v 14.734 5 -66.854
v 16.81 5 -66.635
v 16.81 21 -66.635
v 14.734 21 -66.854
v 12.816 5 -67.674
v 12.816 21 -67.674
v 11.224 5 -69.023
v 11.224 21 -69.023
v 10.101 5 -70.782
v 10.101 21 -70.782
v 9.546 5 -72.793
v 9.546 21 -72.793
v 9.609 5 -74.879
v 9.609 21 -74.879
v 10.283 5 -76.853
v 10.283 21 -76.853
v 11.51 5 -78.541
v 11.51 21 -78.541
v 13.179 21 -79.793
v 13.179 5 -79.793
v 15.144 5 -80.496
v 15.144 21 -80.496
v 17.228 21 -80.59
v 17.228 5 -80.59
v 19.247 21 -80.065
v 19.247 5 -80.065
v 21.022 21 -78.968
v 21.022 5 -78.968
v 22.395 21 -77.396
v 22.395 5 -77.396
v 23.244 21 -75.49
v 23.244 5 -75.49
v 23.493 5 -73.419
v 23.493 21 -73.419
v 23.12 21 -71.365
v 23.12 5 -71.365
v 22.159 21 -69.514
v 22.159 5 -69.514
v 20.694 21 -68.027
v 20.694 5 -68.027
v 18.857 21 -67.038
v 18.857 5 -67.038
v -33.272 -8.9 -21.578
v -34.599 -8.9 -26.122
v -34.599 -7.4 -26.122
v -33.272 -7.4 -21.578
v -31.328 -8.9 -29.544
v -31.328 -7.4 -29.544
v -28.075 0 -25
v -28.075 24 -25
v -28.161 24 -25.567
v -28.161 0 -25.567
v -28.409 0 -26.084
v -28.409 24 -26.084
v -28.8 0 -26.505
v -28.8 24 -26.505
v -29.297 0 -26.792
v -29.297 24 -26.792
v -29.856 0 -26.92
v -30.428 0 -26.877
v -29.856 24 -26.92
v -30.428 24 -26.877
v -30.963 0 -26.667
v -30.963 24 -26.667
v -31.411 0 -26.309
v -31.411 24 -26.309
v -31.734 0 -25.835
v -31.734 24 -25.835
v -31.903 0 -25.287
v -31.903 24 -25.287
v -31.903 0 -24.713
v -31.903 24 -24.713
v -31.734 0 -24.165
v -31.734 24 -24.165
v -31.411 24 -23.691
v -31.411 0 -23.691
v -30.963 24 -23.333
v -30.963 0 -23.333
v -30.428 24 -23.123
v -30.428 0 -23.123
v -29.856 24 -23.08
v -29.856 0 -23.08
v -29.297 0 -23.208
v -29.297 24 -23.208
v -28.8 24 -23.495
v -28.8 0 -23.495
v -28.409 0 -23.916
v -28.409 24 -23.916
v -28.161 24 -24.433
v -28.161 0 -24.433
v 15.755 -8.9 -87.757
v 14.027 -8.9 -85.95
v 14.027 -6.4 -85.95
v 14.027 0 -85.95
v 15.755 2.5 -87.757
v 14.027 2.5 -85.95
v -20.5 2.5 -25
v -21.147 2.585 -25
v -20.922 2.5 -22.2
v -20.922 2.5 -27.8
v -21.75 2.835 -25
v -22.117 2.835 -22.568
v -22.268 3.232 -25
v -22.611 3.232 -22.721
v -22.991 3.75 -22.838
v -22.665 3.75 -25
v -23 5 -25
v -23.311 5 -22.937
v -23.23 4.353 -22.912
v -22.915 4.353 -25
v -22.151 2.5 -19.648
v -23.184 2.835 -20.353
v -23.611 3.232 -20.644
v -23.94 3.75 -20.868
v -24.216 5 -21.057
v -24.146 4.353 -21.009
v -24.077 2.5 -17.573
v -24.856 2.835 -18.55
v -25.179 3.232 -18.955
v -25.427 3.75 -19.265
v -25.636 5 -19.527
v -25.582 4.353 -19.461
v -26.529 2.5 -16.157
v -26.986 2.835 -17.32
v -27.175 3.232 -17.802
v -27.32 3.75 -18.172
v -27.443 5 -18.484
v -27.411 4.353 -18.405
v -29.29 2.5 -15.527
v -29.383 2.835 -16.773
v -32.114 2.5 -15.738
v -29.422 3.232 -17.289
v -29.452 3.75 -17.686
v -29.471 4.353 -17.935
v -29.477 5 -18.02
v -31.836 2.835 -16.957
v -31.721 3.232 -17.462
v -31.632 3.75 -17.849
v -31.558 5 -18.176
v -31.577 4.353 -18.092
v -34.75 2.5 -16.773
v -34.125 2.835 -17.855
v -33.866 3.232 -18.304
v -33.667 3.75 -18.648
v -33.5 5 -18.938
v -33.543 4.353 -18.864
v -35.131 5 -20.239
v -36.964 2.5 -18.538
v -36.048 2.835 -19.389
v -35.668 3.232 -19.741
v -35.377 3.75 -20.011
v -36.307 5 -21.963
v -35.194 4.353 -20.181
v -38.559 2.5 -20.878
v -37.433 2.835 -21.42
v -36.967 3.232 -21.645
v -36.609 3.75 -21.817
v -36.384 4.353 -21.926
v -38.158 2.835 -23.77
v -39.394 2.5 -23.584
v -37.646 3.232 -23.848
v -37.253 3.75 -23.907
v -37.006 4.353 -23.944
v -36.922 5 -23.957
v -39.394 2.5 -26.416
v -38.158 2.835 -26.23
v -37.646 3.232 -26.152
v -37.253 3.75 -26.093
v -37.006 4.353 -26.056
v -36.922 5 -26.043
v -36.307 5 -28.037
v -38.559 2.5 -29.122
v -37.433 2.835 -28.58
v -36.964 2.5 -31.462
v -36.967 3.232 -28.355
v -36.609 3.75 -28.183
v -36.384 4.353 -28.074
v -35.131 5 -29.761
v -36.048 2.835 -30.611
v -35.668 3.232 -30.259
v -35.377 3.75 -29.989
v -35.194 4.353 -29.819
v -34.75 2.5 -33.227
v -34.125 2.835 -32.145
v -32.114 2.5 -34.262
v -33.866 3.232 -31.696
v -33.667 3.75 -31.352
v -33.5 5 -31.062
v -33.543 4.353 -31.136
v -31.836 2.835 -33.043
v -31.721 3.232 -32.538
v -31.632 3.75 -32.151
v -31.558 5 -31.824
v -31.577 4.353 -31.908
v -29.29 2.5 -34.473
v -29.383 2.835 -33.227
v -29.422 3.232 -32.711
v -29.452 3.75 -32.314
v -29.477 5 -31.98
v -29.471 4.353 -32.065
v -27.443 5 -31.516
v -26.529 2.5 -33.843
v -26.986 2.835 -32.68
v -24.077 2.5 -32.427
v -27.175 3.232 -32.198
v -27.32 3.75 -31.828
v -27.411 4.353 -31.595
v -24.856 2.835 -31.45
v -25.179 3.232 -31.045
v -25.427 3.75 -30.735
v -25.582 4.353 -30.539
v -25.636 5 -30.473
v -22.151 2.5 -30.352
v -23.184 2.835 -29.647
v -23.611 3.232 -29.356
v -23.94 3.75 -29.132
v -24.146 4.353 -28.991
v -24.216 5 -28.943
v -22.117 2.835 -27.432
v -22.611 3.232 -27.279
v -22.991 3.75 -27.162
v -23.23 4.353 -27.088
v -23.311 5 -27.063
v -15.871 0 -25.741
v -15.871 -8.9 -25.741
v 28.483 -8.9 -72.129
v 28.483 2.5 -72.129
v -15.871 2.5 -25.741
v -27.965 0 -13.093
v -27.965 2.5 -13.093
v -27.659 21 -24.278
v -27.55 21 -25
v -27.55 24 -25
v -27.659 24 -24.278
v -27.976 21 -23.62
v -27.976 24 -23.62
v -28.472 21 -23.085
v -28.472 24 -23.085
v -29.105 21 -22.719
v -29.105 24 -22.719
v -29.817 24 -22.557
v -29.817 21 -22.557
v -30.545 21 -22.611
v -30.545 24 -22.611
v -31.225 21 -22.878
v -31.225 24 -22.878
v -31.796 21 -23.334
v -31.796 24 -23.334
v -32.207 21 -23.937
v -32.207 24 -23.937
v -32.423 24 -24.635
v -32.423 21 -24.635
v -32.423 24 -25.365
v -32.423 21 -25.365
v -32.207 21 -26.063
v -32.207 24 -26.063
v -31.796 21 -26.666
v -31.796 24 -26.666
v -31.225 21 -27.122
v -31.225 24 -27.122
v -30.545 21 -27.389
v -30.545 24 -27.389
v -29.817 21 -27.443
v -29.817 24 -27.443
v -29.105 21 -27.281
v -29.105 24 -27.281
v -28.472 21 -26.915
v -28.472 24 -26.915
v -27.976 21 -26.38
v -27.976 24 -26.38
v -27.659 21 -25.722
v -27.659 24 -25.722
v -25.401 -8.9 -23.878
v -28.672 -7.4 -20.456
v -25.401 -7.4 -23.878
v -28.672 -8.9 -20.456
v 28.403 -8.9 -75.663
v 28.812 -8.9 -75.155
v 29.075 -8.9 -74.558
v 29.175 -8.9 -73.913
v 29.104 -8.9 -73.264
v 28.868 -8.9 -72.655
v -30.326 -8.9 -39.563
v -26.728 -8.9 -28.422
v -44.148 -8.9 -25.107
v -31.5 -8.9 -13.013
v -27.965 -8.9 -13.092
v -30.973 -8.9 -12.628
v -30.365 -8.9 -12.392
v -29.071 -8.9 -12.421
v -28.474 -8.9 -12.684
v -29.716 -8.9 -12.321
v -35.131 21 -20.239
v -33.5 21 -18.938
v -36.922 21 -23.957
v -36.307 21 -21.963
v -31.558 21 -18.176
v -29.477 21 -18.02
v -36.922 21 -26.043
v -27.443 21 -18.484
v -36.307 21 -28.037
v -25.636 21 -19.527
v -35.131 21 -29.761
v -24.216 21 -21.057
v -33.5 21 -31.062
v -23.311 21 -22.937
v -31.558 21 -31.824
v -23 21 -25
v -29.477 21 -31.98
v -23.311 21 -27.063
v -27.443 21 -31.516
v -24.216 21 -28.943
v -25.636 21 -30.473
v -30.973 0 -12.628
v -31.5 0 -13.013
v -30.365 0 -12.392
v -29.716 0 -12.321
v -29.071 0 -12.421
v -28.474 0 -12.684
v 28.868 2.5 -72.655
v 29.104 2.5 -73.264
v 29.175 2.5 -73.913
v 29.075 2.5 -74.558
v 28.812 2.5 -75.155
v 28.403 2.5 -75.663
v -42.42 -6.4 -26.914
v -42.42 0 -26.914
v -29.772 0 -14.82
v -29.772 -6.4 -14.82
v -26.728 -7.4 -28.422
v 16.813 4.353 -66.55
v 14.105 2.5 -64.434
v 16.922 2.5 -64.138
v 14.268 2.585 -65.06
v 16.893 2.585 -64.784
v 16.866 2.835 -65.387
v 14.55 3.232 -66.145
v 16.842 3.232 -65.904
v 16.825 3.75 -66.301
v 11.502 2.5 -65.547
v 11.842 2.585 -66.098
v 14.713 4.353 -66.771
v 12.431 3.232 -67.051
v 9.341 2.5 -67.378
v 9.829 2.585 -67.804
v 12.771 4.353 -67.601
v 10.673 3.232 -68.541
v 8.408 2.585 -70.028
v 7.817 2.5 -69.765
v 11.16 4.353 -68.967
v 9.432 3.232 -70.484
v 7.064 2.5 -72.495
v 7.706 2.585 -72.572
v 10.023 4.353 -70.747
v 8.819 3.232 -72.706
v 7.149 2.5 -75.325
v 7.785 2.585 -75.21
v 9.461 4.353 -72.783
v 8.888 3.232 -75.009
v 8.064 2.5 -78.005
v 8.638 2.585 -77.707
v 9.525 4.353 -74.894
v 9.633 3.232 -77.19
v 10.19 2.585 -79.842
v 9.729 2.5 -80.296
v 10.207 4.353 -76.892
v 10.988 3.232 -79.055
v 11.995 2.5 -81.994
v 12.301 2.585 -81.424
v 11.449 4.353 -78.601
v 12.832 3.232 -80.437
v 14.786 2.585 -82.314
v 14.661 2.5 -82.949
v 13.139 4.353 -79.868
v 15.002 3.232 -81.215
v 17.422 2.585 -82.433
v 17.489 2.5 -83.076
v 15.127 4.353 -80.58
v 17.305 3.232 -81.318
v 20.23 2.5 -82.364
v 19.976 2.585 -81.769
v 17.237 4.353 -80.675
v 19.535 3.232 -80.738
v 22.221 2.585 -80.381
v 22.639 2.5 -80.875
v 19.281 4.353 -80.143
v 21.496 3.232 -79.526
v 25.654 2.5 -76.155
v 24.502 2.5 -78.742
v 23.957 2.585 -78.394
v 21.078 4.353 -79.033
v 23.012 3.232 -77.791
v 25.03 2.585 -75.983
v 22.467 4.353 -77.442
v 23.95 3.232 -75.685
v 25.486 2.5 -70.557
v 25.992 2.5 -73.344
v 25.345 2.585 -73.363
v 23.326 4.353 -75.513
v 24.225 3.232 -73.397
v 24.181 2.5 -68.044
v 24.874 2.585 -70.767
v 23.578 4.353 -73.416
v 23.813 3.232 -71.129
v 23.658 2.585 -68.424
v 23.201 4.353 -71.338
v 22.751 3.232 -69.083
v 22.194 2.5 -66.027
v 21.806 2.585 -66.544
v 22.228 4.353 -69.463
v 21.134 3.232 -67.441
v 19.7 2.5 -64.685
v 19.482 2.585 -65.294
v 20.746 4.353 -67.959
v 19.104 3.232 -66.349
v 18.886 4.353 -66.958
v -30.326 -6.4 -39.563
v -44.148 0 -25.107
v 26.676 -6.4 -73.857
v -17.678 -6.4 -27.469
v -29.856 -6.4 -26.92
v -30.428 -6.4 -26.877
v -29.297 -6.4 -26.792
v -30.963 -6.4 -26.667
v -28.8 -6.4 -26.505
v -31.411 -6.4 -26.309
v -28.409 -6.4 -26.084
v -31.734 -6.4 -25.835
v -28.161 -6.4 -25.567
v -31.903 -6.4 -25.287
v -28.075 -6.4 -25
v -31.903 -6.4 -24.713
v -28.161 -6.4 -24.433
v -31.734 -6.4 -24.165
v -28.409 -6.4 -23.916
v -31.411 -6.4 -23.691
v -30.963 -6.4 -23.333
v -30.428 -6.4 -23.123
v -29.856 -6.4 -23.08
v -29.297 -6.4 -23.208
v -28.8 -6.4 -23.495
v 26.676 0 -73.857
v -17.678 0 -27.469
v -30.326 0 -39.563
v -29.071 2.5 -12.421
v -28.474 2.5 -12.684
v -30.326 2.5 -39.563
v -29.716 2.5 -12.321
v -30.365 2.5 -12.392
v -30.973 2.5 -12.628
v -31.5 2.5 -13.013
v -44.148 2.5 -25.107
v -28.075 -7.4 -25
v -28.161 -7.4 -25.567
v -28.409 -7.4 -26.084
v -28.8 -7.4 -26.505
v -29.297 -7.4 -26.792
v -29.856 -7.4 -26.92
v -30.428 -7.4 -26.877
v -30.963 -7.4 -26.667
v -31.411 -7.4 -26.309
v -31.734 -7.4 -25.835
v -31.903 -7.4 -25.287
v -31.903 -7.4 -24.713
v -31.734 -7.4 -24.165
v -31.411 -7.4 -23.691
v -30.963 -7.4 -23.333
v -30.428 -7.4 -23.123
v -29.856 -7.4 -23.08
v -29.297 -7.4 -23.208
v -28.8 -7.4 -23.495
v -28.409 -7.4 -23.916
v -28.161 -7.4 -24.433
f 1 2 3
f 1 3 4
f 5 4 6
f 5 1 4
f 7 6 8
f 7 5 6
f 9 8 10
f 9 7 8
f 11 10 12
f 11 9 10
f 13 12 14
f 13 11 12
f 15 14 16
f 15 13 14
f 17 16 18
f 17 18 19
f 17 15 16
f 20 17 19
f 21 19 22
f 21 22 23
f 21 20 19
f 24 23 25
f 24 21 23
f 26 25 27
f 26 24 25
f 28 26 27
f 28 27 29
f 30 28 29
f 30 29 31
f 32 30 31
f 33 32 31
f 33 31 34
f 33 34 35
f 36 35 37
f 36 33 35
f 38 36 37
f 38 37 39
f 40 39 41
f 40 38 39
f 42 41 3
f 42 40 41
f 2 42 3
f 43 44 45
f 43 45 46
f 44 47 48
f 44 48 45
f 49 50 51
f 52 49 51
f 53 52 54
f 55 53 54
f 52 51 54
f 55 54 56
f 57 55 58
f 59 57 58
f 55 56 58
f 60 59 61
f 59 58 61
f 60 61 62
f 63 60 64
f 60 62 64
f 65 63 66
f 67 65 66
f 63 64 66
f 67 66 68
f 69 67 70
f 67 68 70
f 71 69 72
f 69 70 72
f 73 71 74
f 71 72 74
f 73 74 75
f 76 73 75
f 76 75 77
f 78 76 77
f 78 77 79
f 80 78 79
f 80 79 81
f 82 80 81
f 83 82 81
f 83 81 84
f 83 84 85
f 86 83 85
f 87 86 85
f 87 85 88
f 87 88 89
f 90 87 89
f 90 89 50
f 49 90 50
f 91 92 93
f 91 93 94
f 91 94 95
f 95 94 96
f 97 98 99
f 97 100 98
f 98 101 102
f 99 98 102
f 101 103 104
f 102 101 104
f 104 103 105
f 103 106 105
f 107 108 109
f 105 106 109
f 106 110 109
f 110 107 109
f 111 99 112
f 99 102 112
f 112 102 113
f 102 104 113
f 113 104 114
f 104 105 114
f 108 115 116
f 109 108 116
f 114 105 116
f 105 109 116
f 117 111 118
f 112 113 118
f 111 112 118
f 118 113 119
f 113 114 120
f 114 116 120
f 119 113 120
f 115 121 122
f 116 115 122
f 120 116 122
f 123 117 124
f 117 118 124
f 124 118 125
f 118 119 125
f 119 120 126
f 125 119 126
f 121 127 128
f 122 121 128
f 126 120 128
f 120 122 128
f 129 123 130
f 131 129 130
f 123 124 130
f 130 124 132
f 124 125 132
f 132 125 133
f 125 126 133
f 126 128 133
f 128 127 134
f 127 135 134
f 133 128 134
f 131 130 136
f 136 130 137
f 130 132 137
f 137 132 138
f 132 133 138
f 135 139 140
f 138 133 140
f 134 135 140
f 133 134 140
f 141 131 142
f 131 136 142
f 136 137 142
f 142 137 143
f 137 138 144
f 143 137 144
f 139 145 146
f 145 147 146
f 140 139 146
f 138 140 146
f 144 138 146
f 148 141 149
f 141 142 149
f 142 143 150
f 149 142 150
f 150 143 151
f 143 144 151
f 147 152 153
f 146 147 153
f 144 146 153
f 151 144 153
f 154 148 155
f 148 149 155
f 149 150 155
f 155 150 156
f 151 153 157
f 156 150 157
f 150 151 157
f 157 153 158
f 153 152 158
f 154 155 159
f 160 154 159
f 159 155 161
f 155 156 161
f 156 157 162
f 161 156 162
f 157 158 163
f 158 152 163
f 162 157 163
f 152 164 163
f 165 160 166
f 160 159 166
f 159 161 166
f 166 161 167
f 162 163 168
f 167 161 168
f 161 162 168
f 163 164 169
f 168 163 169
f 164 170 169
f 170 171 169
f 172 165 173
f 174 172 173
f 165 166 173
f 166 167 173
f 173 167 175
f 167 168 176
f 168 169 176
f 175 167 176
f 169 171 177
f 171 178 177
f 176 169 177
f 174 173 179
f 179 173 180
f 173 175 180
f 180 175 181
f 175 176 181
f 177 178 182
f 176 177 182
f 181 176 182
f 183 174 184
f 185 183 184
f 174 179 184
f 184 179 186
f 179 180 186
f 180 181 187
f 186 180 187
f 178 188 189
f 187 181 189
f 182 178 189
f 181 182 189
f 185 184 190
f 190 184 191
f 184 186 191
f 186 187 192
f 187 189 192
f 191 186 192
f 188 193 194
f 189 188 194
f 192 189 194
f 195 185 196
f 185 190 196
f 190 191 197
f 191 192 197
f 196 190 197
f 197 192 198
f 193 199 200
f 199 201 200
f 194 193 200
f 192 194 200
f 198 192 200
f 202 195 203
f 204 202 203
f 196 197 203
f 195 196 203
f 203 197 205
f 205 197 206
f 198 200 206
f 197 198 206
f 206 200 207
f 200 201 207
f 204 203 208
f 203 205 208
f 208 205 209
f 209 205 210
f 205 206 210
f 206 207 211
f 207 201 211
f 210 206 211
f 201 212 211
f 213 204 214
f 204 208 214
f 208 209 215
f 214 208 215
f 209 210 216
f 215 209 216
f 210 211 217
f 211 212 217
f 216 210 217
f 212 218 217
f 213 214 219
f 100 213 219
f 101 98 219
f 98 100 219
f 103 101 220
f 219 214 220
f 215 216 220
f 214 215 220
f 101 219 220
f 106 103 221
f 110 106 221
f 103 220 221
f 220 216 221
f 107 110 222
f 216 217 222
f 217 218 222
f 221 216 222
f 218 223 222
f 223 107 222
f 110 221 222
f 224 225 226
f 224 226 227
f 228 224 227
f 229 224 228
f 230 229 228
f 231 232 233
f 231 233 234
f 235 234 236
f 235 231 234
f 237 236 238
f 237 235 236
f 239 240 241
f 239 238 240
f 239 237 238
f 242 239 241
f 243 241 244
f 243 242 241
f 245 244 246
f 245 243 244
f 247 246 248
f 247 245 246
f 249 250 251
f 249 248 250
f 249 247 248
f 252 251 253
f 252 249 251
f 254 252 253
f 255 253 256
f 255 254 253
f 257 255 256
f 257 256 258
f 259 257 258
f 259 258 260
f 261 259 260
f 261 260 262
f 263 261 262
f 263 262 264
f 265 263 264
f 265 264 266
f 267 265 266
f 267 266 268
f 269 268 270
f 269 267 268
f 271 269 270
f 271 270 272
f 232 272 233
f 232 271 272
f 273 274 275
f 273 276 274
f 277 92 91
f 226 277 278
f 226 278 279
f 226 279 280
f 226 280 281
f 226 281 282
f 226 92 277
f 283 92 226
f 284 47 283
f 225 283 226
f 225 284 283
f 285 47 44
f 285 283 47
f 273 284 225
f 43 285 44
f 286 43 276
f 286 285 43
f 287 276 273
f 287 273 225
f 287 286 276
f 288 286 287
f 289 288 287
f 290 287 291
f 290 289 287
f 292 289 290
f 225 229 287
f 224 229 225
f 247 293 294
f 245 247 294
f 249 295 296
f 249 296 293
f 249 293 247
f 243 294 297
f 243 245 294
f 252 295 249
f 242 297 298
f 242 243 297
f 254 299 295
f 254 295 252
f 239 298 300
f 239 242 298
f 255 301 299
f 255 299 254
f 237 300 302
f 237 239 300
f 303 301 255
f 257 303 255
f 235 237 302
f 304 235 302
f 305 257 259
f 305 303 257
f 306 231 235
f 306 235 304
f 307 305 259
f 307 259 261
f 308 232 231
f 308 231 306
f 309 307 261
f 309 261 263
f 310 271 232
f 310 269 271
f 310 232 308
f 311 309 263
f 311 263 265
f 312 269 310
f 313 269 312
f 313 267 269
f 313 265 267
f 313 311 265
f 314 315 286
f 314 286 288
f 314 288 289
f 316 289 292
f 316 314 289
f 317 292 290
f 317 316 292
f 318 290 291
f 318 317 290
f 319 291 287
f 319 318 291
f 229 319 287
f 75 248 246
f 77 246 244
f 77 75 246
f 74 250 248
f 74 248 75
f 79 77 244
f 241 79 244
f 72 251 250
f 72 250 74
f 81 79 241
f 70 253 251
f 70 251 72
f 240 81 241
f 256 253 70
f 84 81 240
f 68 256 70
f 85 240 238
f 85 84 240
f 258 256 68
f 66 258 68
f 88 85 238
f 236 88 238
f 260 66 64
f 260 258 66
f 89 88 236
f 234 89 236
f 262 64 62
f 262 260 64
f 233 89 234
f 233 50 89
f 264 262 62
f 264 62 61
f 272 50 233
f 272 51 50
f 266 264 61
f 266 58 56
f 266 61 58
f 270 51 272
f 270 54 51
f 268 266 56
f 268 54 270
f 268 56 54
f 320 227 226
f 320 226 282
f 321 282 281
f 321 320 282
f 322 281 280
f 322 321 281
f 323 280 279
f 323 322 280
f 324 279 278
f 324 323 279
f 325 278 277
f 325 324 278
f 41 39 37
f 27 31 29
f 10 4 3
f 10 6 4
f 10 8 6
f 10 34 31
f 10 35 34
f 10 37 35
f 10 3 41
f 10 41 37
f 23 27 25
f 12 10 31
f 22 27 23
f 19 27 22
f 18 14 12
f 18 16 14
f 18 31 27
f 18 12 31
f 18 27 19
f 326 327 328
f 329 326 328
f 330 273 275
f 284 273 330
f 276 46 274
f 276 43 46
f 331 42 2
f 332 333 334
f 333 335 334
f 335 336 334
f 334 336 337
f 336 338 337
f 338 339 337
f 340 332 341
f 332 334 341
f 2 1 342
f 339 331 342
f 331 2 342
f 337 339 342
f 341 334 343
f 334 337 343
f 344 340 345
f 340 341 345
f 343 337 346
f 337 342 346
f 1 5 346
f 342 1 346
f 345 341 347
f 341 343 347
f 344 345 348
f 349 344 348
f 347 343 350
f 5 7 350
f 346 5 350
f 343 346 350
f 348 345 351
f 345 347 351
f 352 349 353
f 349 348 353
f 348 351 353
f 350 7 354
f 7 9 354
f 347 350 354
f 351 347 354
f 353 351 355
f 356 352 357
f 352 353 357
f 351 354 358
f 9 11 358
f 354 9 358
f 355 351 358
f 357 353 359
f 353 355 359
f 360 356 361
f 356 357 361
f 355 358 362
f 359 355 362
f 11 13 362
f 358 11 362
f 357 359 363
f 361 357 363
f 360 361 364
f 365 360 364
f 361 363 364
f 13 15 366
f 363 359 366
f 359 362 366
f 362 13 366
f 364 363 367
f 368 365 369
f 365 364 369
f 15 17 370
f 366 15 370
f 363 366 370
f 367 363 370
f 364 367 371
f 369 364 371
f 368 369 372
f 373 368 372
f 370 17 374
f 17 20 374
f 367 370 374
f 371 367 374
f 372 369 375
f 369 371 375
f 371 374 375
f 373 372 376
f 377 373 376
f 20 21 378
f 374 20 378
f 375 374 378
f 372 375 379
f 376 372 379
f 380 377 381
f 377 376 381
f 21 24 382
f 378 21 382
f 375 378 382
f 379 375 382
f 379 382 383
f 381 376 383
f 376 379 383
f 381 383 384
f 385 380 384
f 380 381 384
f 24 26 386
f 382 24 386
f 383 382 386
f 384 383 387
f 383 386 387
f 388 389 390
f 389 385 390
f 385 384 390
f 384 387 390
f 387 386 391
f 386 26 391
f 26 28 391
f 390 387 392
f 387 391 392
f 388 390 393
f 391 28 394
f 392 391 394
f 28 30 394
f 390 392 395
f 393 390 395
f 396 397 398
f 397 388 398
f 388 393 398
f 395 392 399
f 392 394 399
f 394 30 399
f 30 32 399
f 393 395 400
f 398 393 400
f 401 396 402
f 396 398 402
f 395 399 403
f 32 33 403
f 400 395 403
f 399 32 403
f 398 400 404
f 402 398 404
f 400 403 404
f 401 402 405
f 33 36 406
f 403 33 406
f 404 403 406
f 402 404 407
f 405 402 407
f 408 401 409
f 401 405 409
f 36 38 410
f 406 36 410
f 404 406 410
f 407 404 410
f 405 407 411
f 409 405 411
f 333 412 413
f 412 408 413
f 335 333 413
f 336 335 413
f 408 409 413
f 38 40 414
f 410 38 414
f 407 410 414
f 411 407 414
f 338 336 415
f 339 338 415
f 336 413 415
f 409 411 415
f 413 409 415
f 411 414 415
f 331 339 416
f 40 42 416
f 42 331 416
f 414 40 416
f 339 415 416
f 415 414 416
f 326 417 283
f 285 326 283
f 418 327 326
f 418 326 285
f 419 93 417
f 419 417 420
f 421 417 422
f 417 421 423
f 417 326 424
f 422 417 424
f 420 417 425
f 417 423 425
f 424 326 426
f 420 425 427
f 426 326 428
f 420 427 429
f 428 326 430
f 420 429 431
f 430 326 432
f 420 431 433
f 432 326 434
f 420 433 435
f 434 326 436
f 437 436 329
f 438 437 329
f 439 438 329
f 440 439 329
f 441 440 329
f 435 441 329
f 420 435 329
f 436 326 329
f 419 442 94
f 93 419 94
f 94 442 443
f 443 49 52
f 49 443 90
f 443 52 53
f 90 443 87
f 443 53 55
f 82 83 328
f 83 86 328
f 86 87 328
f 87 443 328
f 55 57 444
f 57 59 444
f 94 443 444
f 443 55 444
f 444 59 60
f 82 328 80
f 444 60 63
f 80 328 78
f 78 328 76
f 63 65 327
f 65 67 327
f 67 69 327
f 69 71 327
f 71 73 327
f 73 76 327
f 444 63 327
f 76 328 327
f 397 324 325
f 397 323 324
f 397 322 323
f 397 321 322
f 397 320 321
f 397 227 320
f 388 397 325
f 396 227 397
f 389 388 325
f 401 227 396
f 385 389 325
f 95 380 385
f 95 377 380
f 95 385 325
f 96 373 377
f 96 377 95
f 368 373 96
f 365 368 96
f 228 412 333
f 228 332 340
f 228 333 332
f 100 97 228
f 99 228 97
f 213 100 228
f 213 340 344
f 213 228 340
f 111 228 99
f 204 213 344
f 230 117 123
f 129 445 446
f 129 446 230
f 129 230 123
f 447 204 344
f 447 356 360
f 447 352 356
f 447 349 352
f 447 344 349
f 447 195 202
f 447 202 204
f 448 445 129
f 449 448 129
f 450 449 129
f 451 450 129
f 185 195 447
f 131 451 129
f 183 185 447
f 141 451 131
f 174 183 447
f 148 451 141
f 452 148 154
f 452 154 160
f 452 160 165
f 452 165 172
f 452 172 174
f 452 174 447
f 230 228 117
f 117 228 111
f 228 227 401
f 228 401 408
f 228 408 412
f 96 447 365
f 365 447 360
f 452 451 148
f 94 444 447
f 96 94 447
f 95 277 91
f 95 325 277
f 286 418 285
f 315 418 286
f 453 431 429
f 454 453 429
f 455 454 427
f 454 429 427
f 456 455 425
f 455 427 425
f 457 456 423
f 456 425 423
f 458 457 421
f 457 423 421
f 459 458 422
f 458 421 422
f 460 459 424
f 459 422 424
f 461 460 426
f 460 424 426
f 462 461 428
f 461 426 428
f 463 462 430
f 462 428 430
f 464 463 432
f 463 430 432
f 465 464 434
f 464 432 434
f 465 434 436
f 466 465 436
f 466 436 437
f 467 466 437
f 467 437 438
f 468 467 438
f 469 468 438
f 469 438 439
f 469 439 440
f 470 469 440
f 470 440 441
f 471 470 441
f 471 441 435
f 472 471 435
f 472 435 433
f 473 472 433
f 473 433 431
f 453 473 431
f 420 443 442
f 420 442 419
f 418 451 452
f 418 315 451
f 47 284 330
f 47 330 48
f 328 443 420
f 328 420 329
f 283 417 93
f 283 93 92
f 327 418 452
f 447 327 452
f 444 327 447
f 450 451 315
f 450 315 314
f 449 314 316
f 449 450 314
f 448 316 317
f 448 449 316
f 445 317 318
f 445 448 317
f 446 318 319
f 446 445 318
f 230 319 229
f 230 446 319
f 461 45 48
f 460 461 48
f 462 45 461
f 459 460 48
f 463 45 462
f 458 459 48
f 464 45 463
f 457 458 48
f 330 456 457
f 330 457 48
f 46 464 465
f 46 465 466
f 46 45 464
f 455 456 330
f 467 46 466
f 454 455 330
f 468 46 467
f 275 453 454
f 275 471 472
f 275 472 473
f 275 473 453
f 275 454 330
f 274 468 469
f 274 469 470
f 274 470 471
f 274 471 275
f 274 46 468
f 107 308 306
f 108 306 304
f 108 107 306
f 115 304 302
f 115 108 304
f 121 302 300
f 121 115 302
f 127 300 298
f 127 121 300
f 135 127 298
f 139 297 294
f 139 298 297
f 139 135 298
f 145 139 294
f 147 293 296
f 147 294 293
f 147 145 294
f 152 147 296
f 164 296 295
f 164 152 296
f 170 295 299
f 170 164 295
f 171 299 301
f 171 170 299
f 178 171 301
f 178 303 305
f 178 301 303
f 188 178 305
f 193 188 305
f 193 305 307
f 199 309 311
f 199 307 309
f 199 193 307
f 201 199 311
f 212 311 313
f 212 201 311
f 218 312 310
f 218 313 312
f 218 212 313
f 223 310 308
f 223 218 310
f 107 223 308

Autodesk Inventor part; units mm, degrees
sketch "Sketch1" plane through (0, 0, 0) normal (0, 1, 0) x (-1, 0, 0)
  line L0 (0, 0) -> (100, 0)
  line L1 (100, 0) -> (100, -50)
  line L2 (100, -50) -> (0, -50)
  line L3 (0, -50) -> (0, 0)
  dimension "d0" = 100
  dimension "d1" = 50
extrude "Extrusion1" add sketch "Sketch1" along normal blind 3
sketch "Sketch2" plane through (0, 3, 0) normal (0, 1, 0) x (1, 0, 0)
  circle A0 centre (-85, 25) radius 7
  circle A1 centre (-30, 25) radius 7
  line L0 (-100, 50) -> (-100, 0) projected
  line L1 (0, 0) -> (0, 50) projected
  line L2 (0, 50) -> (-100, 50) projected
  dimension "d4" = 14
  dimension "d5" = 14
  dimension "d6" = 15
  dimension "d7" = 30
  dimension "d8" = 25
  dimension "d9" = 25
extrude "Extrusion2" add sketch "Sketch2" along normal blind 18
sketch "Sketch3" plane through (-85, 21, -25) normal (0, 1, 0) x (1, 0, 0)
  circle A0 centre (0, 0) radius 7 projected
  circle A1 centre (55, 0) radius 7 projected
  circle A2 centre (0, 0) radius 2.875
  circle A3 centre (55, 0) radius 2.45
  point P0 (85, -25)
  dimension "d12" = 5.75
  dimension "d13" = 4.9
extrude "Extrusion3" add sketch "Sketch3" along normal blind 3 contours A2 | A3
sketch "Sketch5" plane through (-30, 24, -25) normal (0, 1, 0) x (1, 0, 0)
  circle A0 centre (0, 0) radius 1.925
  point P0 (30, -25)
  dimension "d20" = 3.85
extrude "Extrusion5" cut sketch "Sketch5" against normal up to surface (24 mm away)
sketch "Sketch7" plane through (0, 0, 0) normal (0, -1, 0) x (1, 0, 0)
  line L0 (2.4404, 5.5552) -> (-105.2601, 5.5552)
  line L1 (-105.2601, 5.5552) -> (-105.2601, -59.9514)
  line L2 (-105.2601, -59.9514) -> (2.4404, -59.9514)
  line L3 (2.4404, -59.9514) -> (2.4404, 5.5552)
  circle A0 centre (-30, -25) radius 2.45 projected
  circle A1 centre (-30, -25) radius 7 projected
  point P0 (0, 0)
extrude "Extrusion6" cut sketch "Sketch7" against normal blind 50 contours L3 L2 L1 L0
ref_plane "Work Plane1" through (-108.1719, 0, -146.2869) normal (0, 1, 0) x (0.6910823, 0, -0.7227761)
sketch "Sketch8" plane through (-108.1719, 0, -146.2869) normal (0, 1, 0) x (0.6910823, 0, -0.7227761)
  line L0 (-40.64, -147.32) -> (40.64, -147.32) projected
  line L1 (-40.64, 147.32) -> (-40.64, -147.32) projected
  line L2 (-43.34, -130.02) -> (-40.84, -130.02)
  line L3 (-40.84, -130.02) -> (-40.84, -150.02)
  line L4 (-40.84, -150.02) -> (-43.34, -150.02)
  line L5 (-43.34, -150.02) -> (-43.34, -130.02)
  line L6 (-23.34, -147.52) -> (-40.84, -147.52)
  line L7 (-40.84, -147.52) -> (-40.84, -150.02)
  line L8 (-23.34, -147.52) -> (-23.34, -150.02)
  line L9 (-23.34, -150.02) -> (-40.84, -150.02)
  line L10 (-40.84, -130.02) -> (-23.34, -130.02)
  line L11 (-23.34, -130.02) -> (-23.34, -147.52)
  arc A0 (-33.6873, -142.3194) -> (-35.0746, -141.7135) centre (-33.64, -140.32) ccw projected
  circle A1 centre (-33.64, -140.32) radius 3.8 projected
  circle A2 centre (-33.64, -140.32) radius 7 projected
  point P0 (-30.9769, -179.2803)
  point P1 (-40.84, -150.02)
  dimension "d26" = 0.2
  dimension "d27" = 0.2
  dimension "d29" = 20
  dimension "d30" = 2.5
  dimension "d31" = 2.5
  dimension "d32" = 20
extrude "Extrusion7" add sketch "Sketch8" along normal blind 2.5 contours L1 A2 L0 | L0 L11 L6 L3 L10 L1 | A2 L1 L10 L11 L0 | L8 L9 L3 L6 | L3 L4 L5 L2
sketch "Sketch9" plane through (0, 0, 0) normal (0, -1, 0) x (1, 0, 0)
  line L0 (-29.6926, -11.2856) -> (-15.8709, -25.7411) projected
  line L1 (-15.8709, -25.7411) -> (-17.6779, -27.4688)
  line L2 (-15.8709, -25.7411) -> (-30.3264, -39.5627) projected
  line L3 (-17.6779, -27.4688) -> (-31.4995, -13.0133)
  line L4 (-30.3264, -39.5627) -> (-44.1481, -25.1072) projected
  line L5 (-44.1481, -25.1072) -> (-42.4204, -26.9142)
  line L6 (-42.4204, -26.9142) -> (-29.7718, -14.8202)
  line L7 (-30.3264, -39.5627) -> (-44.1481, -25.1072) projected
  line L8 (-15.8709, -25.7411) -> (-30.3264, -39.5627) projected
  line L9 (-29.6926, -11.2856) -> (-15.8709, -25.7411) projected
  line L10 (-44.1481, -25.1072) -> (-29.6926, -11.2856) projected
  circle A0 centre (-30, -25) radius 1.925 projected
  point P0 (0, 0)
  dimension "d35" = 2.5
  dimension "d36" = 0
  dimension "d37" = 2.5
extrude "Extrusion8" add sketch "Sketch9" along normal blind 6.4 contours L0 L1 L3 L10 | L3 L6 L4 L10
sketch "Sketch10" plane through (0, -6.4, 0) normal (0, -1, 0) x (1, 0, 0)
  line L0 (-30.3264, -39.5627) -> (-44.1481, -25.1072) projected
  line L1 (-44.1481, -25.1072) -> (-29.6926, -11.2856) projected
  line L2 (-29.6926, -11.2856) -> (-15.8709, -25.7411) projected
  line L3 (-15.8709, -25.7411) -> (-30.3264, -39.5627) projected
  circle A0 centre (-30, -25) radius 7 projected
  circle A1 centre (-30, -25) radius 1.925 projected
  point P0 (0, 0)
extrude "Extrusion9" add sketch "Sketch10" along normal blind 2.5 contours L0 L1 L2 L3 | A0
fillet "Fillet1" radius 2.5 1 edges at (-29.6926, -3.2, -11.2856)
fillet "Fillet2" radius 2.5 1 edges at (-37, 2.5, -25)
sketch "Sketch11" plane through (0, -8.9, 0) normal (0, -1, 0) x (1, 0, 0)
  circle A0 centre (-30, -25) radius 1.925 projected
  arc A1 (-27.9649, -13.0925) -> (-31.4995, -13.0133) centre (-29.7718, -14.8202) ccw projected
  line L0 (-31.4995, -13.0133) -> (-44.1481, -25.1072) projected
  line L1 (-44.1481, -25.1072) -> (-30.3264, -39.5627) projected
  line L2 (-30.3264, -39.5627) -> (-15.8709, -25.7411) projected
  line L3 (-15.8709, -25.7411) -> (-27.9649, -13.0925) projected
  circle A2 centre (-30, -25) radius 2.45 projected
  line L4 (-31.3275, -29.5443) -> (-34.5993, -26.1225)
  line L5 (-34.5993, -26.1225) -> (-33.2718, -21.5782)
  line L6 (-33.2718, -21.5782) -> (-28.6725, -20.4557)
  line L7 (-28.6725, -20.4557) -> (-25.4007, -23.8775)
  line L8 (-25.4007, -23.8775) -> (-26.7282, -28.4218)
  line L9 (-26.7282, -28.4218) -> (-31.3275, -29.5443)
  line L10 (-15.8709, -25.7411) -> (-27.9649, -13.0925) projected
  point P0 (0, 0)
  dimension "d44" = 8.2
extrude "Extrusion10" cut sketch "Sketch11" against normal blind 1.5 contours L4 L5 L6 L7 L8 L9
sketch "Sketch12" plane through (-30.3264, 0, -39.5627) normal (0.6910823, 0, -0.7227761) x (-0.7227761, 0, -0.6910823)
  line L0 (-17.5, 0) -> (0, 0) projected
  line L1 (0, 0) -> (0, 2.5) projected
  line L2 (-20, 2.5) -> (0, 2.5) projected
  line L3 (-20, -8.9) -> (-20, 2.5) projected
  line L4 (0, -8.9) -> (-20, -8.9) projected
  line L5 (0, -6.4) -> (0, -8.9) projected
  line L6 (0, -6.4) -> (-17.5, -6.4) projected
  line L7 (-17.5, 0) -> (-17.5, -6.4) projected
  point P0 (-49.2603, 0)
ref_plane "Work Plane2" through (-186.5657, -6, -277.4707) normal (0.6910823, 0, -0.7227761) x (0, 1, 0)
extrude "Extrusion11" add sketch "Sketch12" along normal blind 64.18
sketch "Sketch13" plane through (14.0272, 0, -85.9505) normal (0.6910823, 0, -0.7227761) x (-0.7227761, 0, -0.6910823)
  line L0 (0, 2.5) -> (-17.5, 2.5) projected
  line L1 (-17.5, -8.9) -> (0, -8.9) projected
  line L2 (0, -8.9) -> (0, 2.5) projected
  line L3 (-20, -8.9) -> (-20, 2.5) projected
  line L4 (-17.5, -6.4) -> (-17.5, 0) projected
  line L5 (-17.5, 0) -> (0, 0) projected
  line L6 (0, 0) -> (0, 2.5) projected
  line L7 (0, 2.5) -> (-20, 2.5) projected
  line L8 (-20, 2.5) -> (-20, -8.9) projected
  line L9 (-20, -8.9) -> (0, -8.9) projected
  line L10 (0, -8.9) -> (0, -6.4) projected
  line L11 (0, -6.4) -> (-17.5, -6.4) projected
  point P0 (-49.2603, 0)
  point P1 (-20, 2.5)
extrude "Extrusion12" add sketch "Sketch13" along normal blind 2.5
fillet "Fillet3" radius 2.5 1 edges at (30.2104, -3.2, -73.9358)
ref_plane "Work Plane3" through (-14.1966, -8.9, -56.4323) normal (-0.6910823, 0, 0.7227761) x (0.7227761, 0, 0.6910823)
mirror "Mirror1" about plane through (-14.1966, -8.9, -56.4323) normal (-0.6910823, 0, 0.7227761)
sketch "Sketch14" plane through (16.496, 24, -73.6284) normal (0, 1, 0) x (1, 0, 0)
  circle A0 centre (0, 0) radius 1.925 projected
  circle A1 centre (0, 0) radius 1.925 projected
  circle A2 centre (0, 0) radius 2.45 projected
  point P0 (-16.496, -73.6284)
ref_plane "Work Plane4" through (-246.9785, 21, -281.7123) normal (0, -1, 0) x (0.7227761, 0, 0.6910823)
extrude "Extrusion13" cut sketch "Sketch14" against normal up to surface (3 mm away)
sketch "Sketch15" plane through (16.496, 21, -73.6284) normal (0, 1, 0) x (1, 0, 0)
  circle A0 centre (0, 0) radius 7 projected
  point P0 (-16.496, -73.6284)
ref_plane "Work Plane5" through (-242.7369, 0, -277.4707) normal (0, 1, 0) x (-0.6910823, 0, 0.7227761)
extrude "Extrusion14" add sketch "Sketch15" against normal up to surface (21 mm away)
extrude "Extrusion15" cut sketch "Sketch11" against normal blind 1.5 contours A0 | A2 | L4 L5 L6 L7 L8 L9
extrude "Extrusion16" cut sketch "Sketch5" against normal up to surface (32.9 mm away)
properties part number "Base"
